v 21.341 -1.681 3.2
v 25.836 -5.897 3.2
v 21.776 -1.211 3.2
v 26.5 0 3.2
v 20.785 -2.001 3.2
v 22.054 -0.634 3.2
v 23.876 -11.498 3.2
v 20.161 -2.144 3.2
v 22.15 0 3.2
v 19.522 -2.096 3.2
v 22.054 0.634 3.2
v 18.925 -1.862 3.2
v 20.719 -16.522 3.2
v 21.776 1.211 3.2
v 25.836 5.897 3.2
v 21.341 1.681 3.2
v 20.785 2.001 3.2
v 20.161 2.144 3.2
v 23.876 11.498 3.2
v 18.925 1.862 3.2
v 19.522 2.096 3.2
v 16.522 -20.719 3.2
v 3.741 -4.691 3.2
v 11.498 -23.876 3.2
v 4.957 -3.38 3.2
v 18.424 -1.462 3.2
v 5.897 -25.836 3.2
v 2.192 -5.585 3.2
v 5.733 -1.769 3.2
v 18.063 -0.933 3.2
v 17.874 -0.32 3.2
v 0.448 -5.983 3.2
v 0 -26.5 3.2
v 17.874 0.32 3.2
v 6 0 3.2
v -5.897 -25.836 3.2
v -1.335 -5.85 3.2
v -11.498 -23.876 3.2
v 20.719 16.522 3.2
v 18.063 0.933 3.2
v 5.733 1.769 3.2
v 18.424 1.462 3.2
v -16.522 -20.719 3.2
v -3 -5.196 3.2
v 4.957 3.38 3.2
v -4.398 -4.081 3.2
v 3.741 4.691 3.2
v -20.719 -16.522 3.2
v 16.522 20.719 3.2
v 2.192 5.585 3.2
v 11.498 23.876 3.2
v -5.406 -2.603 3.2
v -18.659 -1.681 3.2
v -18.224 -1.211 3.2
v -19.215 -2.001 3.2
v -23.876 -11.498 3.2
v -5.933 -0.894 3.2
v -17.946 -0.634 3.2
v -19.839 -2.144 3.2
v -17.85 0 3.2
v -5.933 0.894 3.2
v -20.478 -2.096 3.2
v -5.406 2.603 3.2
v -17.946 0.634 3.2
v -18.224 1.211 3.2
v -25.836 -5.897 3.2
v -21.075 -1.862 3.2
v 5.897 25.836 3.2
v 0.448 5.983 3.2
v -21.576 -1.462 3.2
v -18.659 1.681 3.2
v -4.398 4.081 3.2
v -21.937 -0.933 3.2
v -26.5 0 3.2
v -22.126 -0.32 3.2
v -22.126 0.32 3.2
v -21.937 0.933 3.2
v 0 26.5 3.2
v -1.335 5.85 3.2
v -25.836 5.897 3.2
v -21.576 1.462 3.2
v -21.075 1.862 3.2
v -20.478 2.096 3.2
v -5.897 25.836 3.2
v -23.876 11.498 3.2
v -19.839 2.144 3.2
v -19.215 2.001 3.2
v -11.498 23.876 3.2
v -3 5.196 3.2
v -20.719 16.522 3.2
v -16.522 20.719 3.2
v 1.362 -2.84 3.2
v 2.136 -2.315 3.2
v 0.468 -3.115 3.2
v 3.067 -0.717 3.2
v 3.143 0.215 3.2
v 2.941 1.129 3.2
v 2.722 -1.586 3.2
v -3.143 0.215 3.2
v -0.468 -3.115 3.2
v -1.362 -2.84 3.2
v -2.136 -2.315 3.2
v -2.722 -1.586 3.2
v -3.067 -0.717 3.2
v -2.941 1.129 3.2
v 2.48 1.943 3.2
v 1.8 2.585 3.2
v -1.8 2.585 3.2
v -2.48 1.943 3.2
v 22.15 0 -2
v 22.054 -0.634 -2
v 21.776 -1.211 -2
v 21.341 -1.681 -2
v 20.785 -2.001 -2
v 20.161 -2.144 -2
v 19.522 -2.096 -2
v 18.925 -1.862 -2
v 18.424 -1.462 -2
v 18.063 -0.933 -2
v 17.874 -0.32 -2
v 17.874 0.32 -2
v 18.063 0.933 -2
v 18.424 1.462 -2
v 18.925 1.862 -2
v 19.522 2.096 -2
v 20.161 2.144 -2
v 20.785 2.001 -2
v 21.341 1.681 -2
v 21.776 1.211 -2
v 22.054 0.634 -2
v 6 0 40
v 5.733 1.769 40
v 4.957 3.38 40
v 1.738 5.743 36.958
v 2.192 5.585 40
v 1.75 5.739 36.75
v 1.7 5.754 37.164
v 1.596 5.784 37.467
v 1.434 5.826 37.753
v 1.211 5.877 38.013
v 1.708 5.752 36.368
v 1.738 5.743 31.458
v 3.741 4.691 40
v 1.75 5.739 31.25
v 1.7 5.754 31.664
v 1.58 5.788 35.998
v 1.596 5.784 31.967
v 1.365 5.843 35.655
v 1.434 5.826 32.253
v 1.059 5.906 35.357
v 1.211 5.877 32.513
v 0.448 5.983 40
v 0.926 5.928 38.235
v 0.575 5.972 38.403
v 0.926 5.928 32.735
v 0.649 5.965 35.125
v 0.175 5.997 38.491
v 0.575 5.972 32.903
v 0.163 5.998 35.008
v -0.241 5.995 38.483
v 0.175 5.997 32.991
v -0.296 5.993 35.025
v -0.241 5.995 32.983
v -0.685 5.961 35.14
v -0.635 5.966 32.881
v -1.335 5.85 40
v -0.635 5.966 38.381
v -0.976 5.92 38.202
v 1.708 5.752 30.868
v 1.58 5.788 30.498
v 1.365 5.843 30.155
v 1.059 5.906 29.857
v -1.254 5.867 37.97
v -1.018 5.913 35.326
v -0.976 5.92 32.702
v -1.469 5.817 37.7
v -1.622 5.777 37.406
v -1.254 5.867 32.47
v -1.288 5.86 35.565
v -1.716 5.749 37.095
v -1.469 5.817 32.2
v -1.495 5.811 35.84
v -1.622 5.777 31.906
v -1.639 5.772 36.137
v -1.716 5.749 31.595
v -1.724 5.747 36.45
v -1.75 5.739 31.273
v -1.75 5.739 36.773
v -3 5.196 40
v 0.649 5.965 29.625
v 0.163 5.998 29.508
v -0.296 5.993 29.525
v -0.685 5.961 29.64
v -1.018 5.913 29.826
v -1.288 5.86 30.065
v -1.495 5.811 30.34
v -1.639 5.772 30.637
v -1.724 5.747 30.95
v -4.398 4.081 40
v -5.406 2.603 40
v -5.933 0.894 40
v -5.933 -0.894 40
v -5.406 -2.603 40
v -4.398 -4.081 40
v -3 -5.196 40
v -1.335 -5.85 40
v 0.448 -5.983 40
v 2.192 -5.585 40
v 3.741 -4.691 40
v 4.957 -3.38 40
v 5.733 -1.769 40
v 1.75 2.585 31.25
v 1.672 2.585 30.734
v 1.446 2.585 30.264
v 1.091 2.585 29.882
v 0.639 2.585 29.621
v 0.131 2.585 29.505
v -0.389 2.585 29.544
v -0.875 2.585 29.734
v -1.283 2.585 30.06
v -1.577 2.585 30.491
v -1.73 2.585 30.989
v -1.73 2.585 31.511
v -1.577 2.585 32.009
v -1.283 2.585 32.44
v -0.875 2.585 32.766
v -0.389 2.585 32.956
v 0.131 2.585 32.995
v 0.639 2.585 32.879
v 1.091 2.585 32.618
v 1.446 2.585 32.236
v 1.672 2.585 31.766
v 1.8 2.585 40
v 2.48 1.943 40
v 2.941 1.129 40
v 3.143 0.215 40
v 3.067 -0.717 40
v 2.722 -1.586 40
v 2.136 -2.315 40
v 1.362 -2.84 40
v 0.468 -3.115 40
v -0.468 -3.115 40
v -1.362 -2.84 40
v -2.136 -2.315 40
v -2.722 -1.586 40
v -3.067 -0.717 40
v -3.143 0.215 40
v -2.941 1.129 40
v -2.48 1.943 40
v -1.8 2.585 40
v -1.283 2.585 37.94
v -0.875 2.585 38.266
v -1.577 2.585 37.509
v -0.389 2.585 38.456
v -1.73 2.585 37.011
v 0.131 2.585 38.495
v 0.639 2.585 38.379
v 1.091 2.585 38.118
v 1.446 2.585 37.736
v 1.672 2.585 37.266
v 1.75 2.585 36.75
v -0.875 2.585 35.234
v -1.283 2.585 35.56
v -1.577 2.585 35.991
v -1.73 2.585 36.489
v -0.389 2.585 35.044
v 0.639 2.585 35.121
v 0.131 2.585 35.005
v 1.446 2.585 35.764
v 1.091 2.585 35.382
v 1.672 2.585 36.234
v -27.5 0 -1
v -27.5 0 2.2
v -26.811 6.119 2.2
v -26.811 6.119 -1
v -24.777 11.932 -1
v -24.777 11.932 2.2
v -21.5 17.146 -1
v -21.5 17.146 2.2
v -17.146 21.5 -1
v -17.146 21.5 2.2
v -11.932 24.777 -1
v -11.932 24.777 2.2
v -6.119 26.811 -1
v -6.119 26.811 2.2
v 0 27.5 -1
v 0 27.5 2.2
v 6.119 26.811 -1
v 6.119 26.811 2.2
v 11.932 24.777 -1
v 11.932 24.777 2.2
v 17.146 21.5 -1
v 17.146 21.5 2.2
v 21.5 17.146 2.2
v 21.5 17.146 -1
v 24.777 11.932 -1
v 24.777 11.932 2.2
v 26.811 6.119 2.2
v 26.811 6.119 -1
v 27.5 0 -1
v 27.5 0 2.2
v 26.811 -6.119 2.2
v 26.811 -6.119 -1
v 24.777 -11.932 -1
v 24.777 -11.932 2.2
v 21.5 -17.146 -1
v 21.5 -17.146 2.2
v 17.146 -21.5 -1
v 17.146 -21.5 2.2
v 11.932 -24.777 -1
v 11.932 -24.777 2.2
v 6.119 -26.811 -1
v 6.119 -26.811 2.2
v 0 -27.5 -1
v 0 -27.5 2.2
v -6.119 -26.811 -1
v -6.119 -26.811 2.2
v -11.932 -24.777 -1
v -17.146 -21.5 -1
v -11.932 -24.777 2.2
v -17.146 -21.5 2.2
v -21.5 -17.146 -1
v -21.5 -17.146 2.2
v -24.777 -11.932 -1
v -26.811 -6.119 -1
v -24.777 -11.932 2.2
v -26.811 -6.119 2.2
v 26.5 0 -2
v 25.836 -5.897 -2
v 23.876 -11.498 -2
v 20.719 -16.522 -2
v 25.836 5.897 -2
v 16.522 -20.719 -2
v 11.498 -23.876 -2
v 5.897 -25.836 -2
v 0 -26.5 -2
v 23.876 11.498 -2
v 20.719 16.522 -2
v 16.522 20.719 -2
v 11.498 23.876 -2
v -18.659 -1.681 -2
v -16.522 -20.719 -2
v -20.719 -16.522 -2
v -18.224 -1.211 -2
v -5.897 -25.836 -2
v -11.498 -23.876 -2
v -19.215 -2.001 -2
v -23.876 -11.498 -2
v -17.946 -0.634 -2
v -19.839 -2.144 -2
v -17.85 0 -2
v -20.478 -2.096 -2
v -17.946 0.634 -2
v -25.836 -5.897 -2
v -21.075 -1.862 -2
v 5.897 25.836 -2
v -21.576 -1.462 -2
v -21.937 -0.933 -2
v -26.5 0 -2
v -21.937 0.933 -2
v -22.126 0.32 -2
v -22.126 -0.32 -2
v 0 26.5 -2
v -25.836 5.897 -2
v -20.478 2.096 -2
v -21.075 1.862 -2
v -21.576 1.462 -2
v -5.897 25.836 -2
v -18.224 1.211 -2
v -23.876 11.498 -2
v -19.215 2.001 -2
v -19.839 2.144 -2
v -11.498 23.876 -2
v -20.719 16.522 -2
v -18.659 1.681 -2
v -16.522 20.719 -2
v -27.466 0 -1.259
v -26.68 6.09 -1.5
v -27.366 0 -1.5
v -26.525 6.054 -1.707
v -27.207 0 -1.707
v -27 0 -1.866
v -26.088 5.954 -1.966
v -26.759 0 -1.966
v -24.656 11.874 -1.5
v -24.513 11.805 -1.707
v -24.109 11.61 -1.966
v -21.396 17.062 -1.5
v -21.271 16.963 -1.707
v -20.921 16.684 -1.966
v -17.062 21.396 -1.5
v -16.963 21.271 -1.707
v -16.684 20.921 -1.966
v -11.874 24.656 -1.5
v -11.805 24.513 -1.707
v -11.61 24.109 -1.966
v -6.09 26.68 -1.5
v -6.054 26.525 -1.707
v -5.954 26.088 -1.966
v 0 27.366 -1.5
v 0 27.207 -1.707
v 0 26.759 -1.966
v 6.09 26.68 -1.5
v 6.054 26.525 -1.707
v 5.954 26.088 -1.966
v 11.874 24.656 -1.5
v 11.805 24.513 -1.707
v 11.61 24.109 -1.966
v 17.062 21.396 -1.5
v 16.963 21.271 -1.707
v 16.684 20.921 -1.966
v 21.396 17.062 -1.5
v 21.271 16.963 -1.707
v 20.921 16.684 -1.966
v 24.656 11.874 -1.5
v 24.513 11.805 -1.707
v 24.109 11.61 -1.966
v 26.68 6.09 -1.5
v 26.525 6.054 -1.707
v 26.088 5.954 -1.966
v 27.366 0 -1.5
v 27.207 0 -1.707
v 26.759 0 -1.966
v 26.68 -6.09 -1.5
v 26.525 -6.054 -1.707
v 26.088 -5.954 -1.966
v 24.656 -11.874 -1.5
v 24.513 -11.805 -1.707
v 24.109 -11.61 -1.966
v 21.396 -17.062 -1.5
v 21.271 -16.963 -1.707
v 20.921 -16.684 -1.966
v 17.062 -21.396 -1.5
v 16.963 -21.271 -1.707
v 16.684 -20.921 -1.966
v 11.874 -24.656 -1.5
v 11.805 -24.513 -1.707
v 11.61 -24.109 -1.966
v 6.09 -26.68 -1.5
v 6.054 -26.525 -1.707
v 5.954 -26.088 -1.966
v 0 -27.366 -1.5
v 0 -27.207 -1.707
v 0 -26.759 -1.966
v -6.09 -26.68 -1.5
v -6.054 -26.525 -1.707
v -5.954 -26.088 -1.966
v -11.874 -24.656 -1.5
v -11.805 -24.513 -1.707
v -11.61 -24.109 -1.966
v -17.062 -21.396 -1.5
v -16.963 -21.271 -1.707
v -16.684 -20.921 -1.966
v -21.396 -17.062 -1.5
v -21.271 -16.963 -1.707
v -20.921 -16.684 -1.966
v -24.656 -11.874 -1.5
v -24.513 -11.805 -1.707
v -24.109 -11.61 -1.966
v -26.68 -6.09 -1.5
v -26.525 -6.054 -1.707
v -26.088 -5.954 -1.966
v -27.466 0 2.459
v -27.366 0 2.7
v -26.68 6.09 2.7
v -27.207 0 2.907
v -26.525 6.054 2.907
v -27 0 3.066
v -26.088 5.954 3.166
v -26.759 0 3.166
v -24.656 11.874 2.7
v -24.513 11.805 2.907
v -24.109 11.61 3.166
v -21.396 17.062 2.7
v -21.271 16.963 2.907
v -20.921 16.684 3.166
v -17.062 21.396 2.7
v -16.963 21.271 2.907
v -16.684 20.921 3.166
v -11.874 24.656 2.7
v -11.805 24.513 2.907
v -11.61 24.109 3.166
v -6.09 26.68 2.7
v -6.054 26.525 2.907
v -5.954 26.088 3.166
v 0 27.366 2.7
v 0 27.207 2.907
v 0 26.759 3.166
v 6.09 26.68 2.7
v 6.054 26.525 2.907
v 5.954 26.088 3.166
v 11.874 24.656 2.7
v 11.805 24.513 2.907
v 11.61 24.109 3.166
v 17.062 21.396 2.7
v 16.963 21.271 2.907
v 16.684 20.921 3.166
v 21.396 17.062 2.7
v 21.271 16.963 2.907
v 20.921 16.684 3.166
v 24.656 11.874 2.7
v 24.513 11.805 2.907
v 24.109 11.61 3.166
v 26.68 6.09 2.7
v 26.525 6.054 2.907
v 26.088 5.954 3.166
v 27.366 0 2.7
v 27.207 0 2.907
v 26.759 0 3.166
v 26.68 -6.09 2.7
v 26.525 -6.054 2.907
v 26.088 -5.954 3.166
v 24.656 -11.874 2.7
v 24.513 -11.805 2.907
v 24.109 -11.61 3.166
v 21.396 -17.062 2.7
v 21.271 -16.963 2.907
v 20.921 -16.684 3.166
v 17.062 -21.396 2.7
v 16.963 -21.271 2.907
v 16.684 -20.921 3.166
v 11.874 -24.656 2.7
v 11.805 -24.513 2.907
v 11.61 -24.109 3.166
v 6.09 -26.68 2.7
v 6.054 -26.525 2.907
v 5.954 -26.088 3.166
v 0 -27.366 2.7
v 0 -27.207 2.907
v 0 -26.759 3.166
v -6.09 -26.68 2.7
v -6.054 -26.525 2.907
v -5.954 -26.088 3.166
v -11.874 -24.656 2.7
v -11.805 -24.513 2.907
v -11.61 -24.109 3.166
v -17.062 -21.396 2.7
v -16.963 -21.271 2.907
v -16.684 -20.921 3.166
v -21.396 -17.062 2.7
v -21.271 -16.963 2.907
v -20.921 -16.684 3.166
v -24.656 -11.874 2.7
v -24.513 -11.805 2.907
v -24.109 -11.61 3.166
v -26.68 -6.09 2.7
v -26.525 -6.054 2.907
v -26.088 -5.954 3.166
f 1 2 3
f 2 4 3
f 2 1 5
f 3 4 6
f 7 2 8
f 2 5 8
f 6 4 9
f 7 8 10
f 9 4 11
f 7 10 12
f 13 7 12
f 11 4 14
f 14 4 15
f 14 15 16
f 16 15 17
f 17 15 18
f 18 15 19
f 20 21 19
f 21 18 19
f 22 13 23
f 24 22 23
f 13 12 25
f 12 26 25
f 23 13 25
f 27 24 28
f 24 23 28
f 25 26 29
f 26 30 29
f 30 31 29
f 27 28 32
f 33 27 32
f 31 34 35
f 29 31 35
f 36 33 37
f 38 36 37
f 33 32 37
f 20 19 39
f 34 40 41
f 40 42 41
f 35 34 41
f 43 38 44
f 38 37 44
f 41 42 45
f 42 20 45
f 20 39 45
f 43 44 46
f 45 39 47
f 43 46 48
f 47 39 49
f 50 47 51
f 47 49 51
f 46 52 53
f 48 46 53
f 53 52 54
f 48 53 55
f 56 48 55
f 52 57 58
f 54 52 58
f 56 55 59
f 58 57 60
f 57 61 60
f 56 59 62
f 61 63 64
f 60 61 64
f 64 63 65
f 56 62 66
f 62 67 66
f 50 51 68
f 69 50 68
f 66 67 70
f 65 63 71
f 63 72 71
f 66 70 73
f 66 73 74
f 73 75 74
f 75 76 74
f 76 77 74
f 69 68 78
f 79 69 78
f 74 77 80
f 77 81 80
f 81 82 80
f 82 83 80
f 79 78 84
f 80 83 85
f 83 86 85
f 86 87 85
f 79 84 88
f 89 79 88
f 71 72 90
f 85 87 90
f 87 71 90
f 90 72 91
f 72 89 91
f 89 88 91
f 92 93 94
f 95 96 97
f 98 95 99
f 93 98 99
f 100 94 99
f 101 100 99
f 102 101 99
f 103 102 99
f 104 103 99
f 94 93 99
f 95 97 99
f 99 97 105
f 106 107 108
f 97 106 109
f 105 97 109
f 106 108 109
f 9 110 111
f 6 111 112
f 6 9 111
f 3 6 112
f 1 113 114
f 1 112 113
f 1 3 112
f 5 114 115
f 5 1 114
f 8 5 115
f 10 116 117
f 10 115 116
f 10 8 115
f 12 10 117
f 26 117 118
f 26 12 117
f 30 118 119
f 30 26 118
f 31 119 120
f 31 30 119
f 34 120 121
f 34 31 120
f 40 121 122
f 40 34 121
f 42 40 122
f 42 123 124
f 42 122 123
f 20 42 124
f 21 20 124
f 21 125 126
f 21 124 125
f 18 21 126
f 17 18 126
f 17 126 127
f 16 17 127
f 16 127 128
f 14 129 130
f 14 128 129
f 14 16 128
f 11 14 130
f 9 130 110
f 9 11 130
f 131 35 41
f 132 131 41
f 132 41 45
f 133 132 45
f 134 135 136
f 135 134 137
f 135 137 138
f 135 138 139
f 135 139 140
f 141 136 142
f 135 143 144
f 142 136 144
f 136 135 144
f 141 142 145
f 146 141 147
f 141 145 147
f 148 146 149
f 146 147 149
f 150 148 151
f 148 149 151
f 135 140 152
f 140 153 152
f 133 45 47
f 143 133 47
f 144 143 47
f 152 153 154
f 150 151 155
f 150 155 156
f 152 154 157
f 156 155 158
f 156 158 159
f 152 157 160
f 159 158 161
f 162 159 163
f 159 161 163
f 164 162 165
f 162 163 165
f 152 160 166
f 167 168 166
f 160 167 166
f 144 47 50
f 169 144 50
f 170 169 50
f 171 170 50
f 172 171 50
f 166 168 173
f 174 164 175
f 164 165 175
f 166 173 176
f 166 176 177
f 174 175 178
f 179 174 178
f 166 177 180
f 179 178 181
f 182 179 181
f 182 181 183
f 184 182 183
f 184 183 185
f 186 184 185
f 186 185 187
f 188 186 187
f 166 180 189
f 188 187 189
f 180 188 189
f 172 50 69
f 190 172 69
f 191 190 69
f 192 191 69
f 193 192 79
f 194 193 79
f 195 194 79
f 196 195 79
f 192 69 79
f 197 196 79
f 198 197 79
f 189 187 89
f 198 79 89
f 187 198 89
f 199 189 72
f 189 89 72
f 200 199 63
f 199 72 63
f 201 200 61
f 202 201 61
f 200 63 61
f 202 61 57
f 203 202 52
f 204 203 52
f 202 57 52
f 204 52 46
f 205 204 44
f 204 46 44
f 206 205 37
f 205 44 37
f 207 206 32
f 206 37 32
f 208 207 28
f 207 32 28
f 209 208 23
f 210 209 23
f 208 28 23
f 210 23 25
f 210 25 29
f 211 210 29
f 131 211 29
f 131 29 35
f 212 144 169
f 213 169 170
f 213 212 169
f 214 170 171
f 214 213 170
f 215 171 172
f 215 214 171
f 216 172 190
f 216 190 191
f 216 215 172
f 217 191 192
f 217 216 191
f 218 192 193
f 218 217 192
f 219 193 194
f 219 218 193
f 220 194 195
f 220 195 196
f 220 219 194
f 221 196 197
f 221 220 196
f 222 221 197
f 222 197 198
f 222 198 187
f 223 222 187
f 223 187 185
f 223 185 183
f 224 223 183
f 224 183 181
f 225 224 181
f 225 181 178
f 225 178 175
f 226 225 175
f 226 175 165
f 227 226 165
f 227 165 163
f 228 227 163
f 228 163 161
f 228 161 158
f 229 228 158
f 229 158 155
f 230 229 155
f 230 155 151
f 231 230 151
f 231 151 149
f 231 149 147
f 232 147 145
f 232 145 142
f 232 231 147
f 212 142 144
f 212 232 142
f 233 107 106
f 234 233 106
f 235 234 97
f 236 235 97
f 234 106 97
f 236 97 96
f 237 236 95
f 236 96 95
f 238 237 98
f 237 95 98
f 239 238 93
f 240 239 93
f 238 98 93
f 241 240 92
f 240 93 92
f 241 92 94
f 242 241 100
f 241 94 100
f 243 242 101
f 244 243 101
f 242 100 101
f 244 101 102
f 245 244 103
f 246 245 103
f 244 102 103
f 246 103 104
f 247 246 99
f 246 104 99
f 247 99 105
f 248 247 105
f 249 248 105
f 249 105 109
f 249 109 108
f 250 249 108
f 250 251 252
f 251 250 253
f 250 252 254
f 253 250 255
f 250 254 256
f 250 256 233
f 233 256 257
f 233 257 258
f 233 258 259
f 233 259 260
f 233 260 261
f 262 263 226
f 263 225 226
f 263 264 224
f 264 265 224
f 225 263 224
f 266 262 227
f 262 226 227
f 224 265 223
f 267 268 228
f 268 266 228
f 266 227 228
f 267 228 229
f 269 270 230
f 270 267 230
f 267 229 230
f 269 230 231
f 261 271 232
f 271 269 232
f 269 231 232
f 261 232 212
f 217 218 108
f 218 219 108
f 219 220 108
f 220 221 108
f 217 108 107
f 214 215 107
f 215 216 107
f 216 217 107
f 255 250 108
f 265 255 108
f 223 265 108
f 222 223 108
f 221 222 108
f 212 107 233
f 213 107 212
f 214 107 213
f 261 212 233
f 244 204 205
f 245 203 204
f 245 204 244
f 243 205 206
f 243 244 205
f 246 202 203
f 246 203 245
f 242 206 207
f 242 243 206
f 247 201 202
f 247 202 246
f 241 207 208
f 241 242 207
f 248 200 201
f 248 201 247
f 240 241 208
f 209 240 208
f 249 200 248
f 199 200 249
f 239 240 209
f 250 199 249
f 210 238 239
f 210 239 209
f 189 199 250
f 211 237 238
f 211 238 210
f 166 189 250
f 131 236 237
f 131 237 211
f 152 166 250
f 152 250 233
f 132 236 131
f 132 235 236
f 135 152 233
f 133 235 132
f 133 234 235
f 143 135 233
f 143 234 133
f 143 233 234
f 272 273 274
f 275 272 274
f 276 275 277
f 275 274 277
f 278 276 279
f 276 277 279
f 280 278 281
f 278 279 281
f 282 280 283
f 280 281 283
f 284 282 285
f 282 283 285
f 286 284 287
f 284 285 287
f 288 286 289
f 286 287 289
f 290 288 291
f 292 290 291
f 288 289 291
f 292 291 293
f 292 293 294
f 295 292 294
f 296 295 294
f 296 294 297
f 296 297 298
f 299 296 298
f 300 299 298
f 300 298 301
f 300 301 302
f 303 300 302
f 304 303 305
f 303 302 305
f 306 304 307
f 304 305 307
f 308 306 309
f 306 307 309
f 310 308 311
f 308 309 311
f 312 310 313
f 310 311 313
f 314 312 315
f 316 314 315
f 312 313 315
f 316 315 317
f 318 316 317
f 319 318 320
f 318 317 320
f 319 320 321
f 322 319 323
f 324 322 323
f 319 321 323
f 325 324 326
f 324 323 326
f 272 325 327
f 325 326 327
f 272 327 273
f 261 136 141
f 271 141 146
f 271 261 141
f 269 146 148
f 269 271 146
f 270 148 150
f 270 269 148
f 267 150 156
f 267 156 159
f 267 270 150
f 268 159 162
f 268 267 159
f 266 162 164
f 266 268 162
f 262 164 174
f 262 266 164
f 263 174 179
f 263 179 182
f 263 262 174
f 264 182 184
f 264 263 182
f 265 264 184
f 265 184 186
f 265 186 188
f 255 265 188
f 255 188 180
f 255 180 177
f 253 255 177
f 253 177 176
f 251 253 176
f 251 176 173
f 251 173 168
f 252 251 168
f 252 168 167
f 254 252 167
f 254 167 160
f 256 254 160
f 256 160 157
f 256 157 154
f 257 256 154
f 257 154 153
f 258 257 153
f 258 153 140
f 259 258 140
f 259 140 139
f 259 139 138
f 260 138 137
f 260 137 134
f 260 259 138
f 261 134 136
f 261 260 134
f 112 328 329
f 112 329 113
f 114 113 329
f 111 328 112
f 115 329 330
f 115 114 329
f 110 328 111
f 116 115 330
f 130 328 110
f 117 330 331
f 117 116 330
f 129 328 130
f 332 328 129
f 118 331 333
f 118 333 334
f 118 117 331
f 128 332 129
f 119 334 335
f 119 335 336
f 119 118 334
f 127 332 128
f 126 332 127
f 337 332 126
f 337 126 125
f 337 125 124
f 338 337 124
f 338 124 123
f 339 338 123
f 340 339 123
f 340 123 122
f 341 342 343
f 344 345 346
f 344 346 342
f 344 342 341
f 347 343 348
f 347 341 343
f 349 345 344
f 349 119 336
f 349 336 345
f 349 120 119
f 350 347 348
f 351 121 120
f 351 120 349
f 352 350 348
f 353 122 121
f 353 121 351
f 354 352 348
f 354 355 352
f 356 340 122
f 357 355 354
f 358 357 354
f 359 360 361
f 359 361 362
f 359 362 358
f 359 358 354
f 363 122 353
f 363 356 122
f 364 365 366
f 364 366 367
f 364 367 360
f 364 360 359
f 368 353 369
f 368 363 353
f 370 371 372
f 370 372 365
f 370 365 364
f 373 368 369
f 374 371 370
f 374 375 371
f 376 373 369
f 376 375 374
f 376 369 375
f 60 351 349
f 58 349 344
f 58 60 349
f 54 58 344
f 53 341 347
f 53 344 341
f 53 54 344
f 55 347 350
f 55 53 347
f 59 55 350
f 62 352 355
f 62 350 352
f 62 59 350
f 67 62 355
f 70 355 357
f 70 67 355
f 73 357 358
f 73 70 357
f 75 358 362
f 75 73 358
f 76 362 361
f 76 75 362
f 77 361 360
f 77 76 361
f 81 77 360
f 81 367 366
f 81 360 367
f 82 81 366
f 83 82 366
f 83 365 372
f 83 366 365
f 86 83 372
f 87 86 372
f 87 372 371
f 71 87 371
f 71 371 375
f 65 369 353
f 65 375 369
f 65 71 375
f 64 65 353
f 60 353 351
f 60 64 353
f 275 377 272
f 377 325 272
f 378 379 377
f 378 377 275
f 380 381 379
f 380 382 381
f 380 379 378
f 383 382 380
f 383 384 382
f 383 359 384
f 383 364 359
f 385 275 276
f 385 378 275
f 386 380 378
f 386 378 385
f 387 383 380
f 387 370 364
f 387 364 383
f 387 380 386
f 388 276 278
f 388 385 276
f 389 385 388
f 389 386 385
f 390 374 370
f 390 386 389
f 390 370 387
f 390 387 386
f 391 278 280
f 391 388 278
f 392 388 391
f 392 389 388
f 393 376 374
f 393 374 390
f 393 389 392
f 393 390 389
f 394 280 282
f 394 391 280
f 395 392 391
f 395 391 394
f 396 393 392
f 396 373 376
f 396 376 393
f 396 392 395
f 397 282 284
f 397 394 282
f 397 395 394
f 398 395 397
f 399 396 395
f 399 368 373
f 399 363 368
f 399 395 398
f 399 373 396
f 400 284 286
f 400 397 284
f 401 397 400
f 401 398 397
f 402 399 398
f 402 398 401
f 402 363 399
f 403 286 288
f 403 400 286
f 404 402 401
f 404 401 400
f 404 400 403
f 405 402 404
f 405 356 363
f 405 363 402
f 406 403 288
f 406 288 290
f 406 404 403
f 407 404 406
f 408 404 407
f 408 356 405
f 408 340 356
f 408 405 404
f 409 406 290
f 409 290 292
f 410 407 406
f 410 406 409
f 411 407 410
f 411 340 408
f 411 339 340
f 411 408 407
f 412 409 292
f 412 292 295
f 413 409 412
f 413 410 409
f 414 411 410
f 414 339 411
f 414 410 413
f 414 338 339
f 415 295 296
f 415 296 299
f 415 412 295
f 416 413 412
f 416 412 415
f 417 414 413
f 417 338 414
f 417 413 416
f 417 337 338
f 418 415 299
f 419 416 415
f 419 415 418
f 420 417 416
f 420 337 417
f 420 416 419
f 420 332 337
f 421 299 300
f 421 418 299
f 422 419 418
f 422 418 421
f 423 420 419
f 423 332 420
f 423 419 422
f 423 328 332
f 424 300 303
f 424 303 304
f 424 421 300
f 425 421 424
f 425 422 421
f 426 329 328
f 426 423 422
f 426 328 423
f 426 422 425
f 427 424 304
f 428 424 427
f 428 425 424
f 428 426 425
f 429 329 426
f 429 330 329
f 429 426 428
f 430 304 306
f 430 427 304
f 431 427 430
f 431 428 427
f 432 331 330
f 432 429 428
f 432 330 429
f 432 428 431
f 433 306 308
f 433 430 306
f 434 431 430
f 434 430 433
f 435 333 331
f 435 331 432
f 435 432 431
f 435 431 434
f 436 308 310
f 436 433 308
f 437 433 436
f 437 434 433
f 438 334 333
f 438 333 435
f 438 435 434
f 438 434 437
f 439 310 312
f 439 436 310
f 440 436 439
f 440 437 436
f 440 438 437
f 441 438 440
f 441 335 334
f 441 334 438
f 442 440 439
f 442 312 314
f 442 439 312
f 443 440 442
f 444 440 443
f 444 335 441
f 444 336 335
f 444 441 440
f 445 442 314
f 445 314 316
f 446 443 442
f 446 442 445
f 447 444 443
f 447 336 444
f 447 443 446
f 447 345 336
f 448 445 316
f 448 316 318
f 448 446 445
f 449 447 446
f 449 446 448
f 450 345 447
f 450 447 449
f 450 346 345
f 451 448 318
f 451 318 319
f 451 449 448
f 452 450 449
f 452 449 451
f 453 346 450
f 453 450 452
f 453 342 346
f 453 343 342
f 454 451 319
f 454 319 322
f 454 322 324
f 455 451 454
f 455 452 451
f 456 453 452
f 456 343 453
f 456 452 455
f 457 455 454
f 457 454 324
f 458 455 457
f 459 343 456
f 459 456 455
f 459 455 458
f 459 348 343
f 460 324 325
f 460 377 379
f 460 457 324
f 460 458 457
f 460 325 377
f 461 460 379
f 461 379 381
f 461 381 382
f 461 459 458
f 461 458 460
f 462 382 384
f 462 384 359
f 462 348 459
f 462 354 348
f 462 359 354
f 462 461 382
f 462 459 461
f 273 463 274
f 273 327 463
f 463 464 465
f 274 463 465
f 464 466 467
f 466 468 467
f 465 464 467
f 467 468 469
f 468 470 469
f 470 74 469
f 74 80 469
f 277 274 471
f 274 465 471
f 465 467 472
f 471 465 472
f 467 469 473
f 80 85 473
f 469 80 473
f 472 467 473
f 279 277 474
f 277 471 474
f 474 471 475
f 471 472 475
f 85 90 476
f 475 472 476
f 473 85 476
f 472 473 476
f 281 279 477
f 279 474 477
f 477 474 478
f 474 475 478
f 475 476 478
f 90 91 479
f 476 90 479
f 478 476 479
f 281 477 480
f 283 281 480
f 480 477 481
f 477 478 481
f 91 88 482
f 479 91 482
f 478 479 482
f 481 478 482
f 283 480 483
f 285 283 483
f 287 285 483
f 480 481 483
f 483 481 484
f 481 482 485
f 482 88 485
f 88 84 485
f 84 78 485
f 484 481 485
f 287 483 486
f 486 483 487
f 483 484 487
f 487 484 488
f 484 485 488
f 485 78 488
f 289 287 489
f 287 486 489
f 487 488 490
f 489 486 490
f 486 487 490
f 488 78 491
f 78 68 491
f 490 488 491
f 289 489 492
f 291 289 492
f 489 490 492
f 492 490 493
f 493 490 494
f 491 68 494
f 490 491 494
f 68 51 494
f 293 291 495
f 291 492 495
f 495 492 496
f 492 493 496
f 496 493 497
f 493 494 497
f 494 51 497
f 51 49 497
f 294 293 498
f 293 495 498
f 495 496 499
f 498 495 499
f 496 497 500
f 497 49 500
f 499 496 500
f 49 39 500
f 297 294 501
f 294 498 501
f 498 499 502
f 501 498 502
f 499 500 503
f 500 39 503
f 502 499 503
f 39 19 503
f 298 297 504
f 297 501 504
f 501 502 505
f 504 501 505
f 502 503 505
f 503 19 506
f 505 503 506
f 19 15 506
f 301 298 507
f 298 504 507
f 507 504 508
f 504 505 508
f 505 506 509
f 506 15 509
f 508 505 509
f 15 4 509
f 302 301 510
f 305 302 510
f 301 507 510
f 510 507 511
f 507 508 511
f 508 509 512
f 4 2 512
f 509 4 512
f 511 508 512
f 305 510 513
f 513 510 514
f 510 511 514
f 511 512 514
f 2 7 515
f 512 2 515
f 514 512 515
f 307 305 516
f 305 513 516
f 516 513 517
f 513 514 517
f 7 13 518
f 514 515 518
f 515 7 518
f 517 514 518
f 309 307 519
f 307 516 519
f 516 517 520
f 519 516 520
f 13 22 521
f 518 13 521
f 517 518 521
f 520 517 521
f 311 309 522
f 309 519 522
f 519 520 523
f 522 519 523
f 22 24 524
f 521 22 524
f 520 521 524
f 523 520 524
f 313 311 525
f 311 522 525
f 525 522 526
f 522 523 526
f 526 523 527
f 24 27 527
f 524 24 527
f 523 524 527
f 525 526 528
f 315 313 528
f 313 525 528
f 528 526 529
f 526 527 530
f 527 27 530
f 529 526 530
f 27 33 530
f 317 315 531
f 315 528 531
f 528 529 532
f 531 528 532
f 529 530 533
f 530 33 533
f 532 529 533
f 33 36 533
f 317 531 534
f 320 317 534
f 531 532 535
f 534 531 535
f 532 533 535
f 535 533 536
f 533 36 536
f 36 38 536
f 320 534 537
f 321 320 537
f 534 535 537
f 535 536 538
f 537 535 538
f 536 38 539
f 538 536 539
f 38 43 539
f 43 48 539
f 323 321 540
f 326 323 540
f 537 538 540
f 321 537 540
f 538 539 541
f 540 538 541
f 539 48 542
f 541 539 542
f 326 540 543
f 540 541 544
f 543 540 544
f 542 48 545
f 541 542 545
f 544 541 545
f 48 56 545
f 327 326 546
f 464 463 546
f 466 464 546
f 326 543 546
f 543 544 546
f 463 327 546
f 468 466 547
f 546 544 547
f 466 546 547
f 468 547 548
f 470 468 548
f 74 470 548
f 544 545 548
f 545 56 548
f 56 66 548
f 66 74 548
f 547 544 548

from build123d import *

# Parameters (mm, degrees)
CROQUIS1_R                   = 6
SALIENTE_EXTRUIR1_DEPTH      = 40
CROQUIS2_R                   = 1.75
CORTAR_EXTRUIR1_DEPTH        = 7.5
SALIENTE_EXTRUIR2_DEPTH      = 2
SALIENTE_EXTRUIR2_DEPTH_BACK = 3.2
CROQUIS3_R                   = 27.5
CORTAR_EXTRUIR2_DEPTH        = 58.240719845
CORTAR_EXTRUIR2_DEPTH_BACK   = 5.2
CROQUIS5_R                   = 2.15
REDONDEO1_R                  = 1


with BuildPart() as part:
    # Croquis1 → Saliente-Extruir1 (new body)
    with BuildSketch(Plane.XY):
        Circle(CROQUIS1_R)
        with BuildLine():
            Line((-1.8, 2.585053191), (1.8, 2.585053191))
            ThreePointArc((1.8, 2.585053191), (0, -3.15), (-1.8, 2.585053191))
        make_face(mode=Mode.SUBTRACT)
    extrude(amount=SALIENTE_EXTRUIR1_DEPTH)

    # Croquis2 → Cortar-Extruir1 (cut)
    with BuildSketch(Plane(origin=(0, 2.585053191, 0), x_dir=(1, 0, 0), z_dir=(0, 1, 0))):
        with Locations((0, -36.75)):
            Circle(CROQUIS2_R)
        with Locations((0, -31.25)):
            Circle(CROQUIS2_R)
    extrude(amount=CORTAR_EXTRUIR1_DEPTH, mode=Mode.SUBTRACT)

    # Croquis3 → Saliente-Extruir2 (add, two sides: drawn at the far end of the back side and taken through both)
    with BuildSketch(Plane(origin=(0, 0, 0), x_dir=(-1, 0, 0), z_dir=(0, 0, -1)).offset(-SALIENTE_EXTRUIR2_DEPTH_BACK)):
        Circle(CROQUIS3_R)
    extrude(amount=SALIENTE_EXTRUIR2_DEPTH + SALIENTE_EXTRUIR2_DEPTH_BACK)

    # Croquis5 → Cortar-Extruir2 (cut, two sides: drawn at the far end of the back side and taken through both)
    with BuildSketch(Plane(origin=(0, 0, -2), x_dir=(-1, 0, 0), z_dir=(0, 0, -1)).offset(-CORTAR_EXTRUIR2_DEPTH_BACK)):
        with Locations(Location((-20, 0, 0), (0, 0, 180))):
            Circle(CROQUIS5_R)
        with Locations(Location((20, 0, 0), (0, 0, 180))):
            Circle(CROQUIS5_R)
    extrude(amount=CORTAR_EXTRUIR2_DEPTH + CORTAR_EXTRUIR2_DEPTH_BACK, mode=Mode.SUBTRACT)

    # Redondeo1
    redondeo1_edges = [part.edges().sort_by_distance(p)[0] for p in [
        (27.5, 0, 3.2),
        (27.5, 0, -2),
    ]]
    fillet(redondeo1_edges, radius=REDONDEO1_R)


solid = part.part
